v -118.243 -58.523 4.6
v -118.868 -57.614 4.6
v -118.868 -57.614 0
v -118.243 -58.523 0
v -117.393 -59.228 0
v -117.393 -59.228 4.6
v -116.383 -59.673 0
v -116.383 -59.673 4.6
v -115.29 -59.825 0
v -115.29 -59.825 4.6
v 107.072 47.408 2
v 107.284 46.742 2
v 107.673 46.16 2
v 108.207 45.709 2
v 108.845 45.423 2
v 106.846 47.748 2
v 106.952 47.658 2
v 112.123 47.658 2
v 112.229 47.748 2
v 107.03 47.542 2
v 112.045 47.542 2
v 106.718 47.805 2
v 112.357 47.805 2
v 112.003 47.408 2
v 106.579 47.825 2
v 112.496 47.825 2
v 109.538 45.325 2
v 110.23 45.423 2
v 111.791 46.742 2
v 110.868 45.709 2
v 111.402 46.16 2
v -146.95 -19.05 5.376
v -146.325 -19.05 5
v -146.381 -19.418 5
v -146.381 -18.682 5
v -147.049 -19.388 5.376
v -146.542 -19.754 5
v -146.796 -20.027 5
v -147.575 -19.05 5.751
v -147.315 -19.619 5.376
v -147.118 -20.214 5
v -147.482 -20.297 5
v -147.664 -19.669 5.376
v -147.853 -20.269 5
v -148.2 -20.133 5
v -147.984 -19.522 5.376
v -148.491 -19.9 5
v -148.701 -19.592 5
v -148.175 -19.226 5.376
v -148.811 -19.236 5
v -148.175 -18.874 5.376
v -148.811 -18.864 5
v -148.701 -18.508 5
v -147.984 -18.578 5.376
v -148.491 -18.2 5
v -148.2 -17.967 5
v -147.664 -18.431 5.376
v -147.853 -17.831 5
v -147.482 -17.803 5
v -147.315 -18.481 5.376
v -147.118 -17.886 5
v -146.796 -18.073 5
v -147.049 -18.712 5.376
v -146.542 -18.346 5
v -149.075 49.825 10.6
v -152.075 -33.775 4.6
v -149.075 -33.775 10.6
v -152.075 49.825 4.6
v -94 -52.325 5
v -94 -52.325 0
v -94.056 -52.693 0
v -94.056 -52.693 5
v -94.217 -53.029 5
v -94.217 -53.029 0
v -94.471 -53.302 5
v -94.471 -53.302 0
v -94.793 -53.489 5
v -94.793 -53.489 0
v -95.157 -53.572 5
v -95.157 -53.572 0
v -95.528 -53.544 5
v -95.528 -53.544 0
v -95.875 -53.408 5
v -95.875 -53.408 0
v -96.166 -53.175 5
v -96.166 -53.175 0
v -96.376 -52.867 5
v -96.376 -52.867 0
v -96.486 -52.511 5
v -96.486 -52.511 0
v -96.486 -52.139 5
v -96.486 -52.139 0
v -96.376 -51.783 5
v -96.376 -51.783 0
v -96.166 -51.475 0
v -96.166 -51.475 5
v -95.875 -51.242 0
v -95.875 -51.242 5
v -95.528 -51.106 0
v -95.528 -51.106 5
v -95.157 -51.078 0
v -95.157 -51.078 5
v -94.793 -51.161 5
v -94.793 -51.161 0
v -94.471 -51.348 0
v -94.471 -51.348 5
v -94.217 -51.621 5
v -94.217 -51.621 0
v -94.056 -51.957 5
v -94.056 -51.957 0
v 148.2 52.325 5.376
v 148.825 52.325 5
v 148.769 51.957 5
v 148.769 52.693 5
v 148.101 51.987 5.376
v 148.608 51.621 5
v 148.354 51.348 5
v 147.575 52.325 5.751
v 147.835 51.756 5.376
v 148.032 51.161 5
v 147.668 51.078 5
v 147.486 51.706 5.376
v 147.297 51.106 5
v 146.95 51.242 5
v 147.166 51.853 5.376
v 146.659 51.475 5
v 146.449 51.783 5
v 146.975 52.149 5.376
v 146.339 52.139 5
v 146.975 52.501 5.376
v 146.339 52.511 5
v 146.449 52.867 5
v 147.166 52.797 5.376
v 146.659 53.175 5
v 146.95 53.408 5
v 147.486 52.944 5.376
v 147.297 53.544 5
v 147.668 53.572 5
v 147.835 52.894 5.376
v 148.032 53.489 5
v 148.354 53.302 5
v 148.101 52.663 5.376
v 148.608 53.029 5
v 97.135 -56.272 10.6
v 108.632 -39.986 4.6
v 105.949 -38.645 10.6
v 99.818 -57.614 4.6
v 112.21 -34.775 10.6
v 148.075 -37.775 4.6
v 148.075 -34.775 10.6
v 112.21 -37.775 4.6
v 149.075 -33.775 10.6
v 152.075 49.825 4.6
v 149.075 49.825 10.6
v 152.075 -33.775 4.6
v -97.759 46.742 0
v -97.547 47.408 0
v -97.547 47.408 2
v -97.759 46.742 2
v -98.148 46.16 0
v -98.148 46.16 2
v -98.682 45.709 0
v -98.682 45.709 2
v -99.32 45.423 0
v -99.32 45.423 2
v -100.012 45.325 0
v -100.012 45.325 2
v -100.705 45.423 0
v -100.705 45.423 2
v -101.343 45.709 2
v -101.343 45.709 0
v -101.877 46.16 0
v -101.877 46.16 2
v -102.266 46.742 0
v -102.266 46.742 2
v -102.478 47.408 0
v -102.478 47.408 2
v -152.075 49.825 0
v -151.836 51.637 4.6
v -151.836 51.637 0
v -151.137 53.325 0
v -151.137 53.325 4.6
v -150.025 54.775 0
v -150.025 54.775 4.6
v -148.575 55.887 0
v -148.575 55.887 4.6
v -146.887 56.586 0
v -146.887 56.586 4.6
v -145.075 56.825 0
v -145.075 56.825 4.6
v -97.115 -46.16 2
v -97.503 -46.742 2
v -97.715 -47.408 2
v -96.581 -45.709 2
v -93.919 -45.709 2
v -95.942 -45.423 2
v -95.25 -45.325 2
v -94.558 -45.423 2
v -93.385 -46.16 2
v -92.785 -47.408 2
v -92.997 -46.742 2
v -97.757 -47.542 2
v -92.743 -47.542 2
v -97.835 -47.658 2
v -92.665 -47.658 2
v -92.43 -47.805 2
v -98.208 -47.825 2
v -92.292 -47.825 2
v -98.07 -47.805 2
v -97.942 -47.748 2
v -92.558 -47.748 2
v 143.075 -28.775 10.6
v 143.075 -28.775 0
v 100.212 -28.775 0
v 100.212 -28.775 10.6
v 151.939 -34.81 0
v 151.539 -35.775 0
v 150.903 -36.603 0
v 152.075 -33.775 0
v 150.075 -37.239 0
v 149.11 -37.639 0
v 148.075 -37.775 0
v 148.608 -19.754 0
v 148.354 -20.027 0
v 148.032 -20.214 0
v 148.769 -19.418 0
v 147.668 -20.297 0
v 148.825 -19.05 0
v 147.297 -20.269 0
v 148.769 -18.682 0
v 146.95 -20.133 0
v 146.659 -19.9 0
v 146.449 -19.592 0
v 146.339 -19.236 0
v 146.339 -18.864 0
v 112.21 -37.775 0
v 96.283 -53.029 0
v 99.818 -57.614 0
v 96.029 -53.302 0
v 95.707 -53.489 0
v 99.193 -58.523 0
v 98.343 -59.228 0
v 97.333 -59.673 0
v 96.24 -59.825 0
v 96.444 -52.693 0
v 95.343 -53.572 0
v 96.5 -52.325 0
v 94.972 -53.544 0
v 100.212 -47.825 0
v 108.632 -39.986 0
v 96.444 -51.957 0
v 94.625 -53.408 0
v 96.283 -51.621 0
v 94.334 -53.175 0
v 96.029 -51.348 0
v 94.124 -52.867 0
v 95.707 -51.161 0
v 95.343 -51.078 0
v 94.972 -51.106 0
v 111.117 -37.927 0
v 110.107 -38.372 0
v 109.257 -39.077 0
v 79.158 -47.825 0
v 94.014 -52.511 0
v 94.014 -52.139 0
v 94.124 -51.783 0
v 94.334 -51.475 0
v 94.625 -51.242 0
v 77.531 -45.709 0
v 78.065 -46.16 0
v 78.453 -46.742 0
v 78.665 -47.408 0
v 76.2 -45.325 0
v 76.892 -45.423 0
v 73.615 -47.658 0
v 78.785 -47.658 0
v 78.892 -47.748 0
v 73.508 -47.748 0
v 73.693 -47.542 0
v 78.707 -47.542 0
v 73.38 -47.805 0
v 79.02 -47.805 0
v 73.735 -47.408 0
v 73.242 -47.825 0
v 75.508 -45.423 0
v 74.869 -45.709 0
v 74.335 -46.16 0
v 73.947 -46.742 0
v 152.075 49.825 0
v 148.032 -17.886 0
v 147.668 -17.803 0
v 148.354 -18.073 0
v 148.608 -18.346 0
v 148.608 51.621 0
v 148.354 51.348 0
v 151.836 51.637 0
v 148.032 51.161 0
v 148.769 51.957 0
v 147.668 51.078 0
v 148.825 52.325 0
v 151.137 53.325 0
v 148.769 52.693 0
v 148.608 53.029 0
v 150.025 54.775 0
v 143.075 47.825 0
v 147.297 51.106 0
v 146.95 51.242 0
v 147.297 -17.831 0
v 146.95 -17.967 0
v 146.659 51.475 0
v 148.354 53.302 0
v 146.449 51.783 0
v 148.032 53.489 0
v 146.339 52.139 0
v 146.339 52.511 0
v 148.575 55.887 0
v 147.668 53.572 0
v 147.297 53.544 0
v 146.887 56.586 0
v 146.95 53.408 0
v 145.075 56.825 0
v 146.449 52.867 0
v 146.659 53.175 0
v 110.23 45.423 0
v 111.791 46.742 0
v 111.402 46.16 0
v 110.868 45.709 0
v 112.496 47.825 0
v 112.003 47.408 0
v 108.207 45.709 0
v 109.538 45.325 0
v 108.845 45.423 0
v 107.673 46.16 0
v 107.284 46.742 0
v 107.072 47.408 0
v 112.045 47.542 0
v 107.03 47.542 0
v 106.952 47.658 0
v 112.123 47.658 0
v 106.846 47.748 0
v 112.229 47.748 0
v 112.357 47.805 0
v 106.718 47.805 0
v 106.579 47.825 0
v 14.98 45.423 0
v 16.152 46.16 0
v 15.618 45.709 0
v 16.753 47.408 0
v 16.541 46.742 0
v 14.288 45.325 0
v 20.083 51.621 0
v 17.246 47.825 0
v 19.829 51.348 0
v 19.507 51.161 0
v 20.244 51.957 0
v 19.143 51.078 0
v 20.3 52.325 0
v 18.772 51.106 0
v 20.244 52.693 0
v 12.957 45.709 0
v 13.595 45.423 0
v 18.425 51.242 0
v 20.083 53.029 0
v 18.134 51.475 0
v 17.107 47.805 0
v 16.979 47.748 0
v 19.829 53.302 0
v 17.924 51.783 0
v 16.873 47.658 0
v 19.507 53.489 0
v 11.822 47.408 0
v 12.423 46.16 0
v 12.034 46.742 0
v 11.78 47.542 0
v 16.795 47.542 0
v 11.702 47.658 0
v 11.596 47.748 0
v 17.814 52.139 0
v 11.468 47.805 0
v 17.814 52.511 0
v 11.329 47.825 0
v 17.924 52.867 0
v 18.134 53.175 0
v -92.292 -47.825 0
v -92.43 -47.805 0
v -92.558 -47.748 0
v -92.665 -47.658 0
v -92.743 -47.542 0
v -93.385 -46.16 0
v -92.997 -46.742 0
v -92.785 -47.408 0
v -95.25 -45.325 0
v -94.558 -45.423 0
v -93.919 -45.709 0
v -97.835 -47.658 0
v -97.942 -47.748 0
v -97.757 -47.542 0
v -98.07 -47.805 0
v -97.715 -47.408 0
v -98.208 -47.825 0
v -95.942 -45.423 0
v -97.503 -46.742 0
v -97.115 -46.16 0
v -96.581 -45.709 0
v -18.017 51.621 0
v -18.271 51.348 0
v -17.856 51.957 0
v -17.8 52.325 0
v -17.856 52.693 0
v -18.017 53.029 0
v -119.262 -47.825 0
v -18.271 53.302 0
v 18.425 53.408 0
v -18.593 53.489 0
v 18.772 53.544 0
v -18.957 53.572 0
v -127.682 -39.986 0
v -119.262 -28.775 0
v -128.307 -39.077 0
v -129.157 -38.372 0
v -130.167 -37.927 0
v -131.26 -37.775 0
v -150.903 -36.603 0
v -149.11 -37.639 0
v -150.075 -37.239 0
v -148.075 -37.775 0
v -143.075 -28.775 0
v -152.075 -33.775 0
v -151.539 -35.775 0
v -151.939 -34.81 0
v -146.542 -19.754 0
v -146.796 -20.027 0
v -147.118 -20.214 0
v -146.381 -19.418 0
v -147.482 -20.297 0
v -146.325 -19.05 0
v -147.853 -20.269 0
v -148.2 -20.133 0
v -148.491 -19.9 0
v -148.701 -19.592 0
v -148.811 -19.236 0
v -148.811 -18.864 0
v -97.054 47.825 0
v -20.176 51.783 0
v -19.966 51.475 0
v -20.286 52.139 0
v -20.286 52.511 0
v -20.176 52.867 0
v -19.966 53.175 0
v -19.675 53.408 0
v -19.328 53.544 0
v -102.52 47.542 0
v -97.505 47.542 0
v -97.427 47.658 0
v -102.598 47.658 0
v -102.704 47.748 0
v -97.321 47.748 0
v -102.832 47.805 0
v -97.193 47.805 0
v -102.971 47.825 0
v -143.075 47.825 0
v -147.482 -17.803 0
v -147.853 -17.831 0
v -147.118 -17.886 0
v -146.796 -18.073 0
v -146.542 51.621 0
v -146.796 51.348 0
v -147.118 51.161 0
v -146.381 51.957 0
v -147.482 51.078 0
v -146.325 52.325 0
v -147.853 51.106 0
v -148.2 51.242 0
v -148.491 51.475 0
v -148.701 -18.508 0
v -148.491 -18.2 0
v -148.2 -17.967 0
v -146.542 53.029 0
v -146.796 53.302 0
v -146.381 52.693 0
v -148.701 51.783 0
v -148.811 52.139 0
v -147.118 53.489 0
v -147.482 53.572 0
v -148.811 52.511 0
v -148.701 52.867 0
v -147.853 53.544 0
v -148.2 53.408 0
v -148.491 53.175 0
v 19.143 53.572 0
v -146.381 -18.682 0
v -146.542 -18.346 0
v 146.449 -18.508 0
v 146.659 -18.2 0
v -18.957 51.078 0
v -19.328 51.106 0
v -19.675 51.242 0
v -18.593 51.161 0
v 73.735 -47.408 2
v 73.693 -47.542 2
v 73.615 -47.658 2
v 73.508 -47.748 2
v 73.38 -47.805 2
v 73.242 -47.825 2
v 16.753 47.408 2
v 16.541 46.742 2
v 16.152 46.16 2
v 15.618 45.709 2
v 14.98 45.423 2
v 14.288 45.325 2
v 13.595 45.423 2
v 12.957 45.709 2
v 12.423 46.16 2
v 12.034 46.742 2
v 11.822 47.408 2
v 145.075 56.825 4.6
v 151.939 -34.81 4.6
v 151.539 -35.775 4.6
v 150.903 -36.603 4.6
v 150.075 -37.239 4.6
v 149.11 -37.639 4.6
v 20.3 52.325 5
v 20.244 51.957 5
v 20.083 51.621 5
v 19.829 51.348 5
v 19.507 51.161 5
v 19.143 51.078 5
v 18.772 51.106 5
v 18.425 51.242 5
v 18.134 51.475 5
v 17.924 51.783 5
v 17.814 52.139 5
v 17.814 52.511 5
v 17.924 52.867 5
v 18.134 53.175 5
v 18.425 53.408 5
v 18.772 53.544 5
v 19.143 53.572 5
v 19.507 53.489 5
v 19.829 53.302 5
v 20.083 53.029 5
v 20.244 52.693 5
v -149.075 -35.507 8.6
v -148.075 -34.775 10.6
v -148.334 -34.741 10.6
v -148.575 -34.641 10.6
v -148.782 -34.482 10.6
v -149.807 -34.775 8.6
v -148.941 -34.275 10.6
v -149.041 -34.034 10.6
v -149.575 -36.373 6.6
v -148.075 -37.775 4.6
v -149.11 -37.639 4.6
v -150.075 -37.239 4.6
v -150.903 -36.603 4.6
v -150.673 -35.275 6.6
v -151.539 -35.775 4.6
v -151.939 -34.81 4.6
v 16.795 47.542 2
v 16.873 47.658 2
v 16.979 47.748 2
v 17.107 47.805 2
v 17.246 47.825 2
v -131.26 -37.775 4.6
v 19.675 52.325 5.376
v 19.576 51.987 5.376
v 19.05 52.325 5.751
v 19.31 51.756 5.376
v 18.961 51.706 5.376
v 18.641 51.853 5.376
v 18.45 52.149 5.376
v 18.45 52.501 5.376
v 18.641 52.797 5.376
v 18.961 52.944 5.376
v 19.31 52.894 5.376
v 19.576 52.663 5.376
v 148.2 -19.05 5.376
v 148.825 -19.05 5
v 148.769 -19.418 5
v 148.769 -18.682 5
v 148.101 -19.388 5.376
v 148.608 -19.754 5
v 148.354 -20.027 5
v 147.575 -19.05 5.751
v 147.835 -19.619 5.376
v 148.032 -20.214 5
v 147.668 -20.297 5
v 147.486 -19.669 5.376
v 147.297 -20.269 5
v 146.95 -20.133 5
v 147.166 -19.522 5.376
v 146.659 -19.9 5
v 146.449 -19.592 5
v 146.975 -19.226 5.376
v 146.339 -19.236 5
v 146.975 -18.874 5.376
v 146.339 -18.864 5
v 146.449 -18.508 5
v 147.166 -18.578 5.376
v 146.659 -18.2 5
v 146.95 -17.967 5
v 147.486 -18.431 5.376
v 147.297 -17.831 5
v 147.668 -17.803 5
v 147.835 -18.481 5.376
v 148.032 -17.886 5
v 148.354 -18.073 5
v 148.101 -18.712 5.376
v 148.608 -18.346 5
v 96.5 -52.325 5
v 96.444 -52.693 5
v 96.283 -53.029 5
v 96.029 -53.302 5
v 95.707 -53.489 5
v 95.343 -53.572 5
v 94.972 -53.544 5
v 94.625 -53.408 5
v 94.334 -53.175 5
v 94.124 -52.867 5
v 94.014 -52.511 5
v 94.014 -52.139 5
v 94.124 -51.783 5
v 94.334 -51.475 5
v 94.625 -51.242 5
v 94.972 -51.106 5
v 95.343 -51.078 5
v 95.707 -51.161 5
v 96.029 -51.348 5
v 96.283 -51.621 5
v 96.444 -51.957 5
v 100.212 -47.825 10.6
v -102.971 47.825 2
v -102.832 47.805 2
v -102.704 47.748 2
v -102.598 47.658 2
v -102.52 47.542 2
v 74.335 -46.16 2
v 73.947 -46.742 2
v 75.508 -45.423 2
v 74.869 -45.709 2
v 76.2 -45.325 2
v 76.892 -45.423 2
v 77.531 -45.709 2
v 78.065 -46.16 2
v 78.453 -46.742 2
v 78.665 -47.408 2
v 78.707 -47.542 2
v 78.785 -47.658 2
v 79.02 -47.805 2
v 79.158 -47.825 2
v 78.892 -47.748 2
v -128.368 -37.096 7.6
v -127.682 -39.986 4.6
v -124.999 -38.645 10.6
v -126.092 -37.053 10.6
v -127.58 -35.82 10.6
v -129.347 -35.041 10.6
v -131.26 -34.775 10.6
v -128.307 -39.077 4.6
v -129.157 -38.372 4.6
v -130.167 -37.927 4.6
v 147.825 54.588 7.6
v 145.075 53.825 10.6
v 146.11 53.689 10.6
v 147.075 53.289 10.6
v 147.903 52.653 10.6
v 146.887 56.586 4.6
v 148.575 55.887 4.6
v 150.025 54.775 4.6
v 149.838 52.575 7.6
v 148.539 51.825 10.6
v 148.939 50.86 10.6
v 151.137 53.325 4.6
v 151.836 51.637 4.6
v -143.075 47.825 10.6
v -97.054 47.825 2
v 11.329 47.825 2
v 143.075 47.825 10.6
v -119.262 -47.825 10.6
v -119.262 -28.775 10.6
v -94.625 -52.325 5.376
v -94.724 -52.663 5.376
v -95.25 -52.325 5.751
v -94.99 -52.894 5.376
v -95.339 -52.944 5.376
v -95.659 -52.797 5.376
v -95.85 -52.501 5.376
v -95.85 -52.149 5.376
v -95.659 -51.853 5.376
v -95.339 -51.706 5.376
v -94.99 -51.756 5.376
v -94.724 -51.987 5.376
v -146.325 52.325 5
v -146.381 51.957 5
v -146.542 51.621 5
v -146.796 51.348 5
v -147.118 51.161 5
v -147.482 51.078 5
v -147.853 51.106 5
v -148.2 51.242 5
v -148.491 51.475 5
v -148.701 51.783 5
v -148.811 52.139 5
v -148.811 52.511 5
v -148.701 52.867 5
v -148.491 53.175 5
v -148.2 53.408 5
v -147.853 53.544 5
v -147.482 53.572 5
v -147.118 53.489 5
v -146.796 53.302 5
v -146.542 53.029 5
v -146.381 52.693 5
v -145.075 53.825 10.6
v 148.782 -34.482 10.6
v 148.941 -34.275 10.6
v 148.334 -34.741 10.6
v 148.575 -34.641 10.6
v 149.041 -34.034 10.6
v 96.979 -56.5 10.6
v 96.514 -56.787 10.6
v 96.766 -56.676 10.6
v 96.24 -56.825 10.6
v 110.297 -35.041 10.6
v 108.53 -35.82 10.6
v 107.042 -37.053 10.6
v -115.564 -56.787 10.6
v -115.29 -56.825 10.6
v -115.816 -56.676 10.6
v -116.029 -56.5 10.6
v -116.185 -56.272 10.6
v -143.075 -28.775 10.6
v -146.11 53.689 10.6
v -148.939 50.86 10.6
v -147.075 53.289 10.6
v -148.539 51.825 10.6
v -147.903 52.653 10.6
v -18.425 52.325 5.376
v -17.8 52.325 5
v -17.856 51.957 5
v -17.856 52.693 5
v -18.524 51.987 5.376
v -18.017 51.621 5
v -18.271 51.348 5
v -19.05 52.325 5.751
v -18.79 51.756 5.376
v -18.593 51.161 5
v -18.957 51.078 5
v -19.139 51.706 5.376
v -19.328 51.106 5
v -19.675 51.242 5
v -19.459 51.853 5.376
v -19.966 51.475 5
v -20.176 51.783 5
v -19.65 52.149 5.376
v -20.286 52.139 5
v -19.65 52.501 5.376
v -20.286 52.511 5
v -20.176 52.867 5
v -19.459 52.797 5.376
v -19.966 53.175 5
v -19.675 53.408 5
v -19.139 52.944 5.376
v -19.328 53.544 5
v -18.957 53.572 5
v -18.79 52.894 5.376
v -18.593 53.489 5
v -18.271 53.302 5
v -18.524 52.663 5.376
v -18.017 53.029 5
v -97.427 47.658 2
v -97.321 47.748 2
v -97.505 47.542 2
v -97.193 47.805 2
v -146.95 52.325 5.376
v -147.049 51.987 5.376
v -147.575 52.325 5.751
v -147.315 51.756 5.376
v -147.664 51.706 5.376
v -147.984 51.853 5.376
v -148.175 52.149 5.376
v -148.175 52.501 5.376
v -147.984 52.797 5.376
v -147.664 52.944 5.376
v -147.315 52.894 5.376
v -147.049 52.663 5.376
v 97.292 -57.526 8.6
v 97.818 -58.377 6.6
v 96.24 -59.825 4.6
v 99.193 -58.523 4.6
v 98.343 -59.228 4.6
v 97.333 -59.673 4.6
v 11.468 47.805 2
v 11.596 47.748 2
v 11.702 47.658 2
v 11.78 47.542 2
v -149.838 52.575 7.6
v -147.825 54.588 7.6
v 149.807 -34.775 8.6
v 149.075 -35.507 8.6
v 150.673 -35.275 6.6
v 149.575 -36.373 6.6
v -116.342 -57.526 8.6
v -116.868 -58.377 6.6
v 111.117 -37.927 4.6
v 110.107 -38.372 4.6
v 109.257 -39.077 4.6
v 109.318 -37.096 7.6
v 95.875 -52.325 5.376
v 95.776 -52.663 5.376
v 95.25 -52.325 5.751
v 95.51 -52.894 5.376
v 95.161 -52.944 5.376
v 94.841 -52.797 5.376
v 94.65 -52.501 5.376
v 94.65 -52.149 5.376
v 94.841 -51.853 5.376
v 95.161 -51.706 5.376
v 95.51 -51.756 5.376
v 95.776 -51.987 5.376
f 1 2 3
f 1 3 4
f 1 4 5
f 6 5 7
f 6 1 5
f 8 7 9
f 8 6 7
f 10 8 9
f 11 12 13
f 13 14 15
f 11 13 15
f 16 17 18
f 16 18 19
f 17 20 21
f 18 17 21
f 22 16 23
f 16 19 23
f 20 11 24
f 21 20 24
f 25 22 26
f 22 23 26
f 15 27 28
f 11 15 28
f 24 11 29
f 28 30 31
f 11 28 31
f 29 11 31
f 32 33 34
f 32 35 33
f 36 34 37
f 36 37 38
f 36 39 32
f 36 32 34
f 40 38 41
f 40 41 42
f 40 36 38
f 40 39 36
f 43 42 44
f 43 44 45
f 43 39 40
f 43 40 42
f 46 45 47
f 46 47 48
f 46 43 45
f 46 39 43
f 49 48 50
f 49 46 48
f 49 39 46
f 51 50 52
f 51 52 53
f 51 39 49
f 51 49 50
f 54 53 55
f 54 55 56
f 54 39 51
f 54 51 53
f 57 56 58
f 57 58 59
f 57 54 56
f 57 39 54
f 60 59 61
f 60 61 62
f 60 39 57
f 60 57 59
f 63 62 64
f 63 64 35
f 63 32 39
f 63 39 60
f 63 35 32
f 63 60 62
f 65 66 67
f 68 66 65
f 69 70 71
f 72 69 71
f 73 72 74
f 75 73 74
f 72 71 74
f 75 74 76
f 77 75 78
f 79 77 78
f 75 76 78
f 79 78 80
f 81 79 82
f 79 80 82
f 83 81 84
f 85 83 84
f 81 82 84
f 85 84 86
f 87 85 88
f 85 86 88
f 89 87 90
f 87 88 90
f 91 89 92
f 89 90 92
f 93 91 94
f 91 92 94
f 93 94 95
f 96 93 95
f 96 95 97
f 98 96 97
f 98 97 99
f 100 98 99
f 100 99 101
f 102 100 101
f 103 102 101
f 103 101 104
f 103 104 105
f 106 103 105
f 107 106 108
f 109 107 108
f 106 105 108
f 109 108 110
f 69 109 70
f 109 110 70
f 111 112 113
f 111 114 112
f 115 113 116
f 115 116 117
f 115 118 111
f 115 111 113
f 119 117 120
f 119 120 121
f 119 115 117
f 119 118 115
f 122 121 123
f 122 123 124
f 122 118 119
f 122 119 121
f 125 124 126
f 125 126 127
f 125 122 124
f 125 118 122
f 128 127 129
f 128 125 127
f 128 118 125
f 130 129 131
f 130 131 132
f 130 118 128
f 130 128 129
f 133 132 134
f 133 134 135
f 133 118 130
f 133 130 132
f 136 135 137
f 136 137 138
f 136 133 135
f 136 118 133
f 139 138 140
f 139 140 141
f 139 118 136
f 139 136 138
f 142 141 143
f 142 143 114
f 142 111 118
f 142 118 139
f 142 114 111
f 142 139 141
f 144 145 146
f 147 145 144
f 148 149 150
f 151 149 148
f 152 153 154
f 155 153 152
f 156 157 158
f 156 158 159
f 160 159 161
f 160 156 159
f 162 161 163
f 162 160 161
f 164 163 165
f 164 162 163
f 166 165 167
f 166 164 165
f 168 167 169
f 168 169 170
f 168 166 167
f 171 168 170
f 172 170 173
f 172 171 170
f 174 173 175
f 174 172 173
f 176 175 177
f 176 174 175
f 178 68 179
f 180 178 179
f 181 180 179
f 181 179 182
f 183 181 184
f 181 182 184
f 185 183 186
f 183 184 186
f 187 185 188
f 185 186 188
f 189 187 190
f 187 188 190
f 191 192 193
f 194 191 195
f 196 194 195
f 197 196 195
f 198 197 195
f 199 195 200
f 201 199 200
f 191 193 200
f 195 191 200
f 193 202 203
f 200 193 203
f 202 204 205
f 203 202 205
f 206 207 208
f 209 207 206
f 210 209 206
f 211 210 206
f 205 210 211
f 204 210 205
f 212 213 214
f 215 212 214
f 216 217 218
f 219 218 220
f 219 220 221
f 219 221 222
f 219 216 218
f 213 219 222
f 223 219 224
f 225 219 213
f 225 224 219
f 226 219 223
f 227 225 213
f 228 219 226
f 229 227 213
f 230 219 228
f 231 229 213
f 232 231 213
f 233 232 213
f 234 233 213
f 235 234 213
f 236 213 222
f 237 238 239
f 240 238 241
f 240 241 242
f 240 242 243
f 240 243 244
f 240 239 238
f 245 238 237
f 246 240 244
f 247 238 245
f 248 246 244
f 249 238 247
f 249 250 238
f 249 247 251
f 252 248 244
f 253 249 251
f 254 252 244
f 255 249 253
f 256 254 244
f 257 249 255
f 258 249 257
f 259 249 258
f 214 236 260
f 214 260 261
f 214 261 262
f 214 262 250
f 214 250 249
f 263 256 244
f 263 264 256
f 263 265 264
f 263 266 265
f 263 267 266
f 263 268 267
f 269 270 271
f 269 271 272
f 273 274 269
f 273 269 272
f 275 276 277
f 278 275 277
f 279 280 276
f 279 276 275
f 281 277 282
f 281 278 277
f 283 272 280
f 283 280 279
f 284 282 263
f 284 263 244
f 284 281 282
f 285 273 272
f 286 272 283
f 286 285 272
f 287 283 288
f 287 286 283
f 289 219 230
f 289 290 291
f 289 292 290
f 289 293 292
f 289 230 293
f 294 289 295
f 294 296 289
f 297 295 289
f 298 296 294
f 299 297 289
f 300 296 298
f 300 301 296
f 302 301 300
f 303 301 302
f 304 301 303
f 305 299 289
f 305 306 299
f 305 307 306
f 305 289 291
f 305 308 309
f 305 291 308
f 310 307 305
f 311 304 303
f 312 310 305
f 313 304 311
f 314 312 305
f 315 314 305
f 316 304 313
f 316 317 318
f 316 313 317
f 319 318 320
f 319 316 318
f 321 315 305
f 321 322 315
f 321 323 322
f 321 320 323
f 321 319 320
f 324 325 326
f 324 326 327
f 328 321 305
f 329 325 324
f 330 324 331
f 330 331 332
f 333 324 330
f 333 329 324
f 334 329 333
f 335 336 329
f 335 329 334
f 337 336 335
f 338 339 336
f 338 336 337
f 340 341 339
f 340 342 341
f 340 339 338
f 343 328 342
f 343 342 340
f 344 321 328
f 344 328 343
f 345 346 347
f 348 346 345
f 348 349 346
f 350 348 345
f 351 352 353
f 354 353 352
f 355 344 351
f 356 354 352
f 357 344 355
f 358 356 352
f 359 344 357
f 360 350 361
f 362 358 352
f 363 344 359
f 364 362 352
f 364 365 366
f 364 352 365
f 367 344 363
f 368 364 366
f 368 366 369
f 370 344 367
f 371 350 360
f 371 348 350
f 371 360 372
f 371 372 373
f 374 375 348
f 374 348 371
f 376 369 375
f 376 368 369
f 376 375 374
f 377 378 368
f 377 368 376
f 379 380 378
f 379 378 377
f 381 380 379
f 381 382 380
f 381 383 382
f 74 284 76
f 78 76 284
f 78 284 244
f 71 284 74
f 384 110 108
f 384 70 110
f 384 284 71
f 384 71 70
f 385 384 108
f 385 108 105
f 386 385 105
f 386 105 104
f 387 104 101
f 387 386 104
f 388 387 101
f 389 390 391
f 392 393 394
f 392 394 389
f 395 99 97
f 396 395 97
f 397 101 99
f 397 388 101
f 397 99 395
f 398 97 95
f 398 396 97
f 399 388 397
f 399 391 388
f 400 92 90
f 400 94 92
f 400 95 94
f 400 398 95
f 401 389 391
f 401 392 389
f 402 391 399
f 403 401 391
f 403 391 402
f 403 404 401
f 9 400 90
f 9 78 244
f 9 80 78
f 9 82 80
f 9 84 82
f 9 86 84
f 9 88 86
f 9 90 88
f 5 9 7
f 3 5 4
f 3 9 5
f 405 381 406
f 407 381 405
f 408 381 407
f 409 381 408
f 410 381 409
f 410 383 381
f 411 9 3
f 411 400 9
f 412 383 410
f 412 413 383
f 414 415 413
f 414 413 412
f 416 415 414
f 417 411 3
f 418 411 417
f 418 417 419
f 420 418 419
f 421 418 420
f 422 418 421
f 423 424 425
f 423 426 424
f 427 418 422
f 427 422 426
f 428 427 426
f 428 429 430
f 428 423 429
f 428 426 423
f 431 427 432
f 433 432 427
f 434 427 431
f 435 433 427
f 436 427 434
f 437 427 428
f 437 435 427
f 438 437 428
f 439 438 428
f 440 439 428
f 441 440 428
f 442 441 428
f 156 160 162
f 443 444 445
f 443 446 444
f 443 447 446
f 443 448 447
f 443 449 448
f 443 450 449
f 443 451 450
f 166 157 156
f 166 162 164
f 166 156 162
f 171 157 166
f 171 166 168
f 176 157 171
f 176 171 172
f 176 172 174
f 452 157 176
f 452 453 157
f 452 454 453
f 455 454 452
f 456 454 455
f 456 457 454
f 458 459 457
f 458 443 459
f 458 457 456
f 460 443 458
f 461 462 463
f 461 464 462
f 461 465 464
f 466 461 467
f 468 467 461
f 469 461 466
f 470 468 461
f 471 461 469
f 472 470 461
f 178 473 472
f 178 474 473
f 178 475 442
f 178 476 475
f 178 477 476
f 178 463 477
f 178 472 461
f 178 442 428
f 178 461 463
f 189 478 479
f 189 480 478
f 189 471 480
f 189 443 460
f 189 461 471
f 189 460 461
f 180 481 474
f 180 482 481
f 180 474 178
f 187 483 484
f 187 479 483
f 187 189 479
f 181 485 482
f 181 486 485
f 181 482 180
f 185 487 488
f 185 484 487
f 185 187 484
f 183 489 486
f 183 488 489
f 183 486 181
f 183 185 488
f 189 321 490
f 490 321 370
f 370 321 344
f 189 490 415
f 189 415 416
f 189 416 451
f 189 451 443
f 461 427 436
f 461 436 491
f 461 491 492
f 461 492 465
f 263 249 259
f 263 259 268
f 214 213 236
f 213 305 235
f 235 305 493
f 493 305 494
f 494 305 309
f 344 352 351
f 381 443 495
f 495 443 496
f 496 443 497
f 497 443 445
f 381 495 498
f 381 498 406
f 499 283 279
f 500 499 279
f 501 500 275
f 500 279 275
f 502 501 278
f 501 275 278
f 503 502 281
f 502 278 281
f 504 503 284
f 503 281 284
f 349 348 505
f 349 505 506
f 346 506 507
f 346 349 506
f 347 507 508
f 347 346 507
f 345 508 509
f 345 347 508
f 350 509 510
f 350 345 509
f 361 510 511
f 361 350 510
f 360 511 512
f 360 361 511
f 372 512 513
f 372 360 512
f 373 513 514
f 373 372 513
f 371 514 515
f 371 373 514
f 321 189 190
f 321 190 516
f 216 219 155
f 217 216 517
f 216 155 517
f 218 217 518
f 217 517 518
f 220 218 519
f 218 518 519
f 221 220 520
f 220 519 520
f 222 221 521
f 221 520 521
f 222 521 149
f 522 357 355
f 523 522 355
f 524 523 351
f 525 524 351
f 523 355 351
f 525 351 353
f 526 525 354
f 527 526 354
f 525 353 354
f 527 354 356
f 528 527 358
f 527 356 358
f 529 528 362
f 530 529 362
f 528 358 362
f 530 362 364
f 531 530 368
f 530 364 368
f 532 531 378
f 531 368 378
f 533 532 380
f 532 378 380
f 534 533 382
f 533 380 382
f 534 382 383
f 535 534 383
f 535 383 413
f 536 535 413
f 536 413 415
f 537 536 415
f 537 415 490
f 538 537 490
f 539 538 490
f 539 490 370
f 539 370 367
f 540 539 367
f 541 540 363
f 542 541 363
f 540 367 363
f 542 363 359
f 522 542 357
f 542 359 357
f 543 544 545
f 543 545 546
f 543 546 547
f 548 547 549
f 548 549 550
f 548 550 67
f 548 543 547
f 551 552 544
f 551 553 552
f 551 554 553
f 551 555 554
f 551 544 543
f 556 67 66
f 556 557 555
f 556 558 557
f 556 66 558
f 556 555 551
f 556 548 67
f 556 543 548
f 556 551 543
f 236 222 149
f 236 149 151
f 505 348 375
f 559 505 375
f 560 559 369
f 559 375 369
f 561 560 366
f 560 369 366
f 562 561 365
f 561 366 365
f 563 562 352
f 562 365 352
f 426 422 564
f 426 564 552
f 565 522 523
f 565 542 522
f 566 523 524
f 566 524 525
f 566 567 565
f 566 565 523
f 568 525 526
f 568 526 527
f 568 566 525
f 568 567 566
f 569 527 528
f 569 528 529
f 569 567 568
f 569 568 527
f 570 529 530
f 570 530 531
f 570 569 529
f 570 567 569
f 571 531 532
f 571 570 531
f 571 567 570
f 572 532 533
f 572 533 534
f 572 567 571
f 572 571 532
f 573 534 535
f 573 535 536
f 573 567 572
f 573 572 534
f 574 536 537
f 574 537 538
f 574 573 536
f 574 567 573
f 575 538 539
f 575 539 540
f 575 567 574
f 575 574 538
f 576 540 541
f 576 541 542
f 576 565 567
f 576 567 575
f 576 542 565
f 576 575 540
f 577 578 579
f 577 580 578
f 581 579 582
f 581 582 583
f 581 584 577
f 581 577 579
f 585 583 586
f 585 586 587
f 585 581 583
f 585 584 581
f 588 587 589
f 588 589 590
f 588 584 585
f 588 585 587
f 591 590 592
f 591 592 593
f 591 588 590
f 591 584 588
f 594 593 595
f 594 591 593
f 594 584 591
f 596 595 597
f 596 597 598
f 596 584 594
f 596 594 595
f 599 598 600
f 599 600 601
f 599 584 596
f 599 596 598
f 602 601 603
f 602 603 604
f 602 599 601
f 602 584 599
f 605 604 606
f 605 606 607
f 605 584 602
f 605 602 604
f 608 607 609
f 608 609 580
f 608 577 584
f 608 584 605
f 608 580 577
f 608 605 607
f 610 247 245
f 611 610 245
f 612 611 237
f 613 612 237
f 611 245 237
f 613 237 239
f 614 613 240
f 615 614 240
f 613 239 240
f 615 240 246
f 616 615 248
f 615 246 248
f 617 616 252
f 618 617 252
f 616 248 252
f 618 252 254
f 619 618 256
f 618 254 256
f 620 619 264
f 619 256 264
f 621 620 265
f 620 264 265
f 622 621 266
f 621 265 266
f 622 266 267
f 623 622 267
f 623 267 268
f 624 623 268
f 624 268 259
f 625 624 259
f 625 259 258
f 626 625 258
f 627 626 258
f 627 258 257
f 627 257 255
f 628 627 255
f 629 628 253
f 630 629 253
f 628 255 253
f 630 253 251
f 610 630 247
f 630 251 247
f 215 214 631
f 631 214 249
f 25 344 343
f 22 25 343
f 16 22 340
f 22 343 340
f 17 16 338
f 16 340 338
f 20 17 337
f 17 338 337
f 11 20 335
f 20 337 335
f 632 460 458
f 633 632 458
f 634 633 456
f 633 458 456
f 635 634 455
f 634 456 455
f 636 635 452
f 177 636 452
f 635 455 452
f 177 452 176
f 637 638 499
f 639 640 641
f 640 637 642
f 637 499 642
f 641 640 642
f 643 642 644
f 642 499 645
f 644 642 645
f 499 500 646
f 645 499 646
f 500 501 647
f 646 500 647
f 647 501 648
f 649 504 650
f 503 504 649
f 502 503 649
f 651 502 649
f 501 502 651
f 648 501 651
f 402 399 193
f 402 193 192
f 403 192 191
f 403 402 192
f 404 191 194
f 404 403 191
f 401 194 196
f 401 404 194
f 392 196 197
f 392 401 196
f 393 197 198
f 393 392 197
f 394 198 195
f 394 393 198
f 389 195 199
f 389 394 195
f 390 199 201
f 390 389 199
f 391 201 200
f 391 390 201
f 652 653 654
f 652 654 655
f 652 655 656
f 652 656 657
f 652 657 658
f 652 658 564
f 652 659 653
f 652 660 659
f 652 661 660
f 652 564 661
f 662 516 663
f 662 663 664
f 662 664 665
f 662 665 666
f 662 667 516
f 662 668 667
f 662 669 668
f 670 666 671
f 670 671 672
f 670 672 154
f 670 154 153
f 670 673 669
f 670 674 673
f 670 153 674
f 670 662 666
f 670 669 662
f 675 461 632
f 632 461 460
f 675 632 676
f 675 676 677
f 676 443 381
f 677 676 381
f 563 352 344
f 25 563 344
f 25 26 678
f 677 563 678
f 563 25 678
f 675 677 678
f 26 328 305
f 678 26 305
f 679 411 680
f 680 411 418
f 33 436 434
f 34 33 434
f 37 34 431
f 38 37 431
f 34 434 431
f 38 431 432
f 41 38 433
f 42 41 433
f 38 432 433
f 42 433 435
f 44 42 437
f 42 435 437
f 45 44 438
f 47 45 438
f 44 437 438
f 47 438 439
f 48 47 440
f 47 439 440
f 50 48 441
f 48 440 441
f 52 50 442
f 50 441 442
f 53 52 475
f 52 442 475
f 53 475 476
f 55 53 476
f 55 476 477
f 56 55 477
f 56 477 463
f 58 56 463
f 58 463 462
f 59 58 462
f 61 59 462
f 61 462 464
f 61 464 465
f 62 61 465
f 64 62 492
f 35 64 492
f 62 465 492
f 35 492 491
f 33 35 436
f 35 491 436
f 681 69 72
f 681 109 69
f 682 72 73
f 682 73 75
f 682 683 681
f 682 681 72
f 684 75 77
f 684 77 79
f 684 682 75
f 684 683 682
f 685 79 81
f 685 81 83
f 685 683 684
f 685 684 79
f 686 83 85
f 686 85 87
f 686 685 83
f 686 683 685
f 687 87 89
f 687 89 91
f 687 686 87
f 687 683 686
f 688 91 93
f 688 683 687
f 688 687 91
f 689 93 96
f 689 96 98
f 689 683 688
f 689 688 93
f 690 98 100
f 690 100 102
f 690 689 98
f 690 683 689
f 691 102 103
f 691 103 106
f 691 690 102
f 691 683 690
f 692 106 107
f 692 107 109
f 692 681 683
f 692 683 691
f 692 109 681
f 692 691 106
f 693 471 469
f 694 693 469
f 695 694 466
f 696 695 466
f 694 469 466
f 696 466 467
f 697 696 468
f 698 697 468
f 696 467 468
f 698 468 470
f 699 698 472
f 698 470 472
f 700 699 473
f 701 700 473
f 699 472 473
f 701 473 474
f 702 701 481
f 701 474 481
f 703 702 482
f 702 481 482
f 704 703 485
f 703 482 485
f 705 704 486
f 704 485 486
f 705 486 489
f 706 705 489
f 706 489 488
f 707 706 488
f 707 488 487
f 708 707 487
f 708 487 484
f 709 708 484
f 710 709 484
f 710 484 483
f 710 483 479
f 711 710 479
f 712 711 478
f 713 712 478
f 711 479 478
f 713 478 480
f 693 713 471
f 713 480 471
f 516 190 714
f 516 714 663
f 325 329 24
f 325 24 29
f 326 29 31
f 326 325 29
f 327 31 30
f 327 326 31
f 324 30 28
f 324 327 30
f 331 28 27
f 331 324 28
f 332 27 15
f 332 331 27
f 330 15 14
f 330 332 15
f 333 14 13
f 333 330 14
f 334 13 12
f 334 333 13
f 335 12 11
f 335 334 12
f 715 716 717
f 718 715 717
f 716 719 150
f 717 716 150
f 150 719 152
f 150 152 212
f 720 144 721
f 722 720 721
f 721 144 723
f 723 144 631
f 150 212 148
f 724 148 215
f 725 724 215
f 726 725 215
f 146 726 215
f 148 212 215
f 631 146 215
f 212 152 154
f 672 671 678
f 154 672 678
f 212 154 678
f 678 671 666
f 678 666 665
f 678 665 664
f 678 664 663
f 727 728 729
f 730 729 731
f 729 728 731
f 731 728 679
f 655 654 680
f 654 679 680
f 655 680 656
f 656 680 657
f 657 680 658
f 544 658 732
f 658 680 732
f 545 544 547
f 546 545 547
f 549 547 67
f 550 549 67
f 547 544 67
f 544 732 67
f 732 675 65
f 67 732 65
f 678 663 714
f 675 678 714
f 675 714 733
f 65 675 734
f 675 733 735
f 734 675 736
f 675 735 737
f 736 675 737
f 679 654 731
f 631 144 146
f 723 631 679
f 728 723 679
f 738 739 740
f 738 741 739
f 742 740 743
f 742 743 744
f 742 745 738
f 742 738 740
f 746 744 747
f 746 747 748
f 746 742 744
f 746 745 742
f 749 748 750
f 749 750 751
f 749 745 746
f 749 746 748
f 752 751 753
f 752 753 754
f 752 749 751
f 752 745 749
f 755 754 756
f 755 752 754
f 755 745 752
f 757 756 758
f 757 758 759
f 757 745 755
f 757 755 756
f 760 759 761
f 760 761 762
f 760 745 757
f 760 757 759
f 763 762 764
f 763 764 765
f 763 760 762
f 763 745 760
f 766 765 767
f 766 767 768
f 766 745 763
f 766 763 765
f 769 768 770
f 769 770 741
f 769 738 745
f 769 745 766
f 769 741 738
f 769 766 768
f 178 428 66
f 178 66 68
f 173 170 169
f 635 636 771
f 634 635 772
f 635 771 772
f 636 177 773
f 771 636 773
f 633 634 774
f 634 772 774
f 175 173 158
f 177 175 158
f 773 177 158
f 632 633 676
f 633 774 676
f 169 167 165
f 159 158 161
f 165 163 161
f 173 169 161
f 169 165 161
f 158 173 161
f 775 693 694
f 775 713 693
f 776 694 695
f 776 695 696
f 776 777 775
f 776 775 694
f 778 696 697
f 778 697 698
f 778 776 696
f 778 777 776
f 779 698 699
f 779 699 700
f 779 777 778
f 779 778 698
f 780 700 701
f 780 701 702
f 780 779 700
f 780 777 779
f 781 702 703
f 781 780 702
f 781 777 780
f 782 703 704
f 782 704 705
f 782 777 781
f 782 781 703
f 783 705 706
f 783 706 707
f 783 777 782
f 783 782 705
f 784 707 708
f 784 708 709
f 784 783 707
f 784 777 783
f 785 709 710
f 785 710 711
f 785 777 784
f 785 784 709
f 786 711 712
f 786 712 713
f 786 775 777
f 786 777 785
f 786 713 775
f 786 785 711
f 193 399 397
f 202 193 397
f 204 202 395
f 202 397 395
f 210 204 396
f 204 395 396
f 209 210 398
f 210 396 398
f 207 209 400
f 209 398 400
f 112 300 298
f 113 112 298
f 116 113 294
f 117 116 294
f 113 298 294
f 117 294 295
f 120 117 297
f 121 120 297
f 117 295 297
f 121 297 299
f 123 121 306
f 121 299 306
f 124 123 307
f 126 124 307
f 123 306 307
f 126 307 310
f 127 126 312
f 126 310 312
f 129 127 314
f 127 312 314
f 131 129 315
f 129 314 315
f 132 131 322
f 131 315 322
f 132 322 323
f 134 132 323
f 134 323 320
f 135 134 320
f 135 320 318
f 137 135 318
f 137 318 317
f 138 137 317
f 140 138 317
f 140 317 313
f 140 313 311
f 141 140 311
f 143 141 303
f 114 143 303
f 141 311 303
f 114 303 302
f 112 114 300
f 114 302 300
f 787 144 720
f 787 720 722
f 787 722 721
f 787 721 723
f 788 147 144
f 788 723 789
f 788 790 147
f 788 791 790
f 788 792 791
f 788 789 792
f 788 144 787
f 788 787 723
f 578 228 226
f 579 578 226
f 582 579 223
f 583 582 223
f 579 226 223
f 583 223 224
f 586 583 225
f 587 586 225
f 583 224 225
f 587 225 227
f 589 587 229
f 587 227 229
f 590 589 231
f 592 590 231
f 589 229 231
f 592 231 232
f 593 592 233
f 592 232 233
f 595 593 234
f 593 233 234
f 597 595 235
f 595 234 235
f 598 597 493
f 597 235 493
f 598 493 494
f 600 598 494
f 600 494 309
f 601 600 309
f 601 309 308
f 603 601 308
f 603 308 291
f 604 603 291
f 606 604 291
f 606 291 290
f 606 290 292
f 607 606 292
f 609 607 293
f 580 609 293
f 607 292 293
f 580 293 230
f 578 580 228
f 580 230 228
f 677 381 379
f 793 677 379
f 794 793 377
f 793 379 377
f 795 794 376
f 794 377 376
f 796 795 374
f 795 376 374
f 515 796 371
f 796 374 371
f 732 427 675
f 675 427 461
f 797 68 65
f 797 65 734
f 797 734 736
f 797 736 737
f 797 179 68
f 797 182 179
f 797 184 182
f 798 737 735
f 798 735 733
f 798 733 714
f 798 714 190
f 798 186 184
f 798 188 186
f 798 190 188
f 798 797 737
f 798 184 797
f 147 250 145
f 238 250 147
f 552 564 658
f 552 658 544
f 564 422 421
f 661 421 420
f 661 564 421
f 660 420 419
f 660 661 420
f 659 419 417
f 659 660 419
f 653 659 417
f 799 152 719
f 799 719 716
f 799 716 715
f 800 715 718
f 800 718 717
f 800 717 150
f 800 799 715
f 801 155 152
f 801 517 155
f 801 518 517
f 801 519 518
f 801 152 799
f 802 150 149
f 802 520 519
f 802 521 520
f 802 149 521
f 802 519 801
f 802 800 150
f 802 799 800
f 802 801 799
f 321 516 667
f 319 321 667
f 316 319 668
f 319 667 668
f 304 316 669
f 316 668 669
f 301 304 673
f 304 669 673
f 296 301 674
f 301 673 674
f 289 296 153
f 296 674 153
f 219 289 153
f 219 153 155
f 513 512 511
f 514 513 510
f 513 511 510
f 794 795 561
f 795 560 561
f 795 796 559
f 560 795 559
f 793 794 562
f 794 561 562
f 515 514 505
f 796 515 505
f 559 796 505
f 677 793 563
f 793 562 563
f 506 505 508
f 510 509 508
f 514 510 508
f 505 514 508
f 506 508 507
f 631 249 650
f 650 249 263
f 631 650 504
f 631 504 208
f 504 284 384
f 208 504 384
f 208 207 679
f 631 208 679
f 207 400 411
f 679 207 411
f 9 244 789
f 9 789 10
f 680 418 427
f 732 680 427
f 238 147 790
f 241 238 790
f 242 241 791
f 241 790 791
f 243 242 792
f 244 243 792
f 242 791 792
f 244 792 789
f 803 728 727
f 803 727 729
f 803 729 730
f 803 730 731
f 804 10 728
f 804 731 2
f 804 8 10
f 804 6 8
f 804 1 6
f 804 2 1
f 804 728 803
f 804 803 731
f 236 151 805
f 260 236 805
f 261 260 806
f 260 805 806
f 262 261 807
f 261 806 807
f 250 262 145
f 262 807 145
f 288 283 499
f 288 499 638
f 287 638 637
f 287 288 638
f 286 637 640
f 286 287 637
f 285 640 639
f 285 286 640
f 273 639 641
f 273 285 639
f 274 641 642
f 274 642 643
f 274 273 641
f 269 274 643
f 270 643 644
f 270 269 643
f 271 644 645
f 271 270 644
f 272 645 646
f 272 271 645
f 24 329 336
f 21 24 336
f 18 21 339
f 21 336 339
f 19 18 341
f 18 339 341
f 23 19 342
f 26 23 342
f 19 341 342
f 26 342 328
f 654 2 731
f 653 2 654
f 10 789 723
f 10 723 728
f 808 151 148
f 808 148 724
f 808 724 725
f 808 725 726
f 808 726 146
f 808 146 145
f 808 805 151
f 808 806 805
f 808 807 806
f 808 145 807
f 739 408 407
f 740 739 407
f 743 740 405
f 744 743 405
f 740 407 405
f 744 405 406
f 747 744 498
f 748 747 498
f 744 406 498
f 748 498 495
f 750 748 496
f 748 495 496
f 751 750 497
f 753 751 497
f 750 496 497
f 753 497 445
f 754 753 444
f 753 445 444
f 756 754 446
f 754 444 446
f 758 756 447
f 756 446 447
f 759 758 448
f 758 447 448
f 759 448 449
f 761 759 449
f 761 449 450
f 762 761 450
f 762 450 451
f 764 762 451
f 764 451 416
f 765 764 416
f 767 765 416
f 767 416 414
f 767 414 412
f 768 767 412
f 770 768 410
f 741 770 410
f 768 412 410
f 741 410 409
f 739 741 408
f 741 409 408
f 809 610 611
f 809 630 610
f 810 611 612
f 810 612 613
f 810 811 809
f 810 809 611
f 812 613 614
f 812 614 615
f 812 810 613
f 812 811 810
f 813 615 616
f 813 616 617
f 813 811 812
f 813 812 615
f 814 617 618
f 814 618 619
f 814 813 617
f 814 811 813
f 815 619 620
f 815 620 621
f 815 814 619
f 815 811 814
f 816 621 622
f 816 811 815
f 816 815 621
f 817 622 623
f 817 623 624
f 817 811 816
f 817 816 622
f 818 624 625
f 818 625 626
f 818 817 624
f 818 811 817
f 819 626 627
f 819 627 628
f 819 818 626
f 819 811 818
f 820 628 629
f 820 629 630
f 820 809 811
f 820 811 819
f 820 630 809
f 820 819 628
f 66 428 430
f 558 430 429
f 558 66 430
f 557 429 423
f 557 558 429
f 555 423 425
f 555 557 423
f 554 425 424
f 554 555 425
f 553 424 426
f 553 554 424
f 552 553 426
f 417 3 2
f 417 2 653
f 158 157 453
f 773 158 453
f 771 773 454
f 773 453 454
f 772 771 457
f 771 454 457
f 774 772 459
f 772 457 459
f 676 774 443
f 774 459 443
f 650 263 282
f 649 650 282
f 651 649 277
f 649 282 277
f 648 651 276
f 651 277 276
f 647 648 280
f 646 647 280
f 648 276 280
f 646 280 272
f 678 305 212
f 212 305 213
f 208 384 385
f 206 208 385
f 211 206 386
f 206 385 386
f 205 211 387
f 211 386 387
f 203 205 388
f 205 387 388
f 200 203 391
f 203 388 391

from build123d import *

# Parameters (mm, degrees)
PAD_DEPTH      = 10.6
PAD005_DEPTH   = 2
FILLET_R       = 4
FILLET014_R    = 7
CHAMFER_SIZE2  = 6
CHAMFER_SIZE   = 3
SKETCH020_R    = 1.25
HOLE007_DEPTH  = 5
HOLE007_TIPS_R = 1.25


with BuildPart() as part:
    # Sketch → Pad (new body)
    with BuildSketch(Plane.XY):
        Polygon((-152.075, 56.825), (152.075, 56.825), (152.075, -37.775), (109.7375, -37.775), (98.7125, -59.825), (-117.7625, -59.825), (-128.7875, -37.775), (-152.075, -37.775), align=None)
        Polygon((-143.075, 47.825), (143.075, 47.825), (143.075, -28.775), (100.2125, -28.775), (100.2125, -47.825), (-119.2625, -47.825), (-119.2625, -28.775), (-143.075, -28.775), align=None, mode=Mode.SUBTRACT)
    extrude(amount=PAD_DEPTH)

    # Sketch011 (on Face17 of Pad) → Pad005 (join)
    with BuildSketch(Plane(origin=(0, 0, 0), x_dir=(1, 0, 0), z_dir=(0, 0, -1))):
        with BuildLine():
            ThreePointArc((16.752533, -47.408333), (14.2875, -45.325), (11.822467, -47.408333))
            ThreePointArc((11.32946, -47.825), (11.652209, -47.706881), (11.822467, -47.408333))
            Line((11.32946, -47.825), (17.24554, -47.825))
            ThreePointArc((16.752533, -47.408333), (16.922791, -47.706881), (17.24554, -47.825))
        make_face()
        with BuildLine():
            ThreePointArc((112.002533, -47.408333), (109.5375, -45.325), (107.072467, -47.408333))
            ThreePointArc((106.57946, -47.825), (106.902209, -47.706881), (107.072467, -47.408333))
            Line((106.57946, -47.825), (112.49554, -47.825))
            ThreePointArc((112.002533, -47.408333), (112.172791, -47.706881), (112.49554, -47.825))
        make_face()
        with BuildLine():
            ThreePointArc((-97.547467, -47.408333), (-100.0125, -45.325), (-102.477533, -47.408333))
            ThreePointArc((-102.97054, -47.825), (-102.647791, -47.706881), (-102.477533, -47.408333))
            Line((-102.97054, -47.825), (-97.05446, -47.825))
            ThreePointArc((-97.547467, -47.408333), (-97.377209, -47.706881), (-97.05446, -47.825))
        make_face()
        with BuildLine():
            ThreePointArc((73.734967, 47.408333), (76.2, 45.325), (78.665033, 47.408333))
            ThreePointArc((79.15804, 47.825), (78.835291, 47.706881), (78.665033, 47.408333))
            Line((73.24196, 47.825), (79.15804, 47.825))
            ThreePointArc((73.734967, 47.408333), (73.564709, 47.706881), (73.24196, 47.825))
        make_face()
        with BuildLine():
            ThreePointArc((-97.715033, 47.408333), (-95.25, 45.325), (-92.784967, 47.408333))
            ThreePointArc((-92.29196, 47.825), (-92.614709, 47.706881), (-92.784967, 47.408333))
            Line((-98.20804, 47.825), (-92.29196, 47.825))
            ThreePointArc((-97.715033, 47.408333), (-97.885291, 47.706881), (-98.20804, 47.825))
        make_face()
    extrude(amount=-PAD005_DEPTH)

    # Fillet
    fillet_edges = [part.edges().sort_by_distance(p)[0] for p in [
        (98.7125, -59.825, 5.3),
        (109.7375, -37.775, 5.3),
        (152.075, -37.775, 5.3),
        (-117.7625, -59.825, 5.3),
        (-152.075, -37.775, 5.3),
        (-128.7875, -37.775, 5.3),
    ]]
    fillet(fillet_edges, radius=FILLET_R)

    # Fillet014
    fillet014_edges = [part.edges().sort_by_distance(p)[0] for p in [
        (152.075, 56.825, 5.3),
        (-152.075, 56.825, 5.3),
    ]]
    fillet(fillet014_edges, radius=FILLET014_R)

    # Chamfer
    chamfer_edges = [part.edges().sort_by_distance(p)[0] for p in [
        (-9.525, -59.825, 10.6),
    ]]
    chamfer_side = part.faces().sort_by_distance((148.817479, 8.025, 10.6))[0]
    chamfer(chamfer_edges, length=CHAMFER_SIZE, length2=CHAMFER_SIZE2, reference=chamfer_side)

    # Sketch020 (on Face4 of Chamfer) → Hole007 (cut)
    with BuildSketch(Plane(origin=(0, 0, 0), x_dir=(1, 0, 0), z_dir=(0, 0, -1))):
        with Locations((95.25, 52.325)):
            Circle(SKETCH020_R)
        with Locations((147.575, 19.05)):
            Circle(SKETCH020_R)
        with Locations((147.575, -52.325)):
            Circle(SKETCH020_R)
        with Locations((19.05, -52.325)):
            Circle(SKETCH020_R)
        with Locations((-19.05, -52.325)):
            Circle(SKETCH020_R)
        with Locations((-147.575, -52.325)):
            Circle(SKETCH020_R)
        with Locations((-147.575, 19.05)):
            Circle(SKETCH020_R)
        with Locations((-95.25, 52.325)):
            Circle(SKETCH020_R)
    extrude(amount=-HOLE007_DEPTH, mode=Mode.SUBTRACT)

    # Hole007 tips → Hole007 tip 1 section 0
    with BuildSketch(Plane(origin=(0, 0, 5), x_dir=(1, 0, 0), z_dir=(0, 0, -1)), mode=Mode.PRIVATE) as hole007_tip_1_s0:
        with Locations((95.25, 52.325)):
            Circle(HOLE007_TIPS_R)
    loft([hole007_tip_1_s0.sketch, Vertex(95.25, -52.325, 5.751076)], mode=Mode.SUBTRACT)

    # Hole007 tips → Hole007 tip 2 section 0
    with BuildSketch(Plane(origin=(0, 0, 5), x_dir=(1, 0, 0), z_dir=(0, 0, -1)), mode=Mode.PRIVATE) as hole007_tip_2_s0:
        with Locations((147.575, 19.05)):
            Circle(HOLE007_TIPS_R)
    loft([hole007_tip_2_s0.sketch, Vertex(147.575, -19.05, 5.751076)], mode=Mode.SUBTRACT)

    # Hole007 tips → Hole007 tip 3 section 0
    with BuildSketch(Plane(origin=(0, 0, 5), x_dir=(1, 0, 0), z_dir=(0, 0, -1)), mode=Mode.PRIVATE) as hole007_tip_3_s0:
        with Locations((147.575, -52.325)):
            Circle(HOLE007_TIPS_R)
    loft([hole007_tip_3_s0.sketch, Vertex(147.575, 52.325, 5.751076)], mode=Mode.SUBTRACT)

    # Hole007 tips → Hole007 tip 4 section 0
    with BuildSketch(Plane(origin=(0, 0, 5), x_dir=(1, 0, 0), z_dir=(0, 0, -1)), mode=Mode.PRIVATE) as hole007_tip_4_s0:
        with Locations((19.05, -52.325)):
            Circle(HOLE007_TIPS_R)
    loft([hole007_tip_4_s0.sketch, Vertex(19.05, 52.325, 5.751076)], mode=Mode.SUBTRACT)

    # Hole007 tips → Hole007 tip 5 section 0
    with BuildSketch(Plane(origin=(0, 0, 5), x_dir=(1, 0, 0), z_dir=(0, 0, -1)), mode=Mode.PRIVATE) as hole007_tip_5_s0:
        with Locations((-19.05, -52.325)):
            Circle(HOLE007_TIPS_R)
    loft([hole007_tip_5_s0.sketch, Vertex(-19.05, 52.325, 5.751076)], mode=Mode.SUBTRACT)

    # Hole007 tips → Hole007 tip 6 section 0
    with BuildSketch(Plane(origin=(0, 0, 5), x_dir=(1, 0, 0), z_dir=(0, 0, -1)), mode=Mode.PRIVATE) as hole007_tip_6_s0:
        with Locations((-147.575, -52.325)):
            Circle(HOLE007_TIPS_R)
    loft([hole007_tip_6_s0.sketch, Vertex(-147.575, 52.325, 5.751076)], mode=Mode.SUBTRACT)

    # Hole007 tips → Hole007 tip 7 section 0
    with BuildSketch(Plane(origin=(0, 0, 5), x_dir=(1, 0, 0), z_dir=(0, 0, -1)), mode=Mode.PRIVATE) as hole007_tip_7_s0:
        with Locations((-147.575, 19.05)):
            Circle(HOLE007_TIPS_R)
    loft([hole007_tip_7_s0.sketch, Vertex(-147.575, -19.05, 5.751076)], mode=Mode.SUBTRACT)

    # Hole007 tips → Hole007 tip 8 section 0
    with BuildSketch(Plane(origin=(0, 0, 5), x_dir=(1, 0, 0), z_dir=(0, 0, -1)), mode=Mode.PRIVATE) as hole007_tip_8_s0:
        with Locations((-95.25, 52.325)):
            Circle(HOLE007_TIPS_R)
    loft([hole007_tip_8_s0.sketch, Vertex(-95.25, -52.325, 5.751076)], mode=Mode.SUBTRACT)


solid = part.part
